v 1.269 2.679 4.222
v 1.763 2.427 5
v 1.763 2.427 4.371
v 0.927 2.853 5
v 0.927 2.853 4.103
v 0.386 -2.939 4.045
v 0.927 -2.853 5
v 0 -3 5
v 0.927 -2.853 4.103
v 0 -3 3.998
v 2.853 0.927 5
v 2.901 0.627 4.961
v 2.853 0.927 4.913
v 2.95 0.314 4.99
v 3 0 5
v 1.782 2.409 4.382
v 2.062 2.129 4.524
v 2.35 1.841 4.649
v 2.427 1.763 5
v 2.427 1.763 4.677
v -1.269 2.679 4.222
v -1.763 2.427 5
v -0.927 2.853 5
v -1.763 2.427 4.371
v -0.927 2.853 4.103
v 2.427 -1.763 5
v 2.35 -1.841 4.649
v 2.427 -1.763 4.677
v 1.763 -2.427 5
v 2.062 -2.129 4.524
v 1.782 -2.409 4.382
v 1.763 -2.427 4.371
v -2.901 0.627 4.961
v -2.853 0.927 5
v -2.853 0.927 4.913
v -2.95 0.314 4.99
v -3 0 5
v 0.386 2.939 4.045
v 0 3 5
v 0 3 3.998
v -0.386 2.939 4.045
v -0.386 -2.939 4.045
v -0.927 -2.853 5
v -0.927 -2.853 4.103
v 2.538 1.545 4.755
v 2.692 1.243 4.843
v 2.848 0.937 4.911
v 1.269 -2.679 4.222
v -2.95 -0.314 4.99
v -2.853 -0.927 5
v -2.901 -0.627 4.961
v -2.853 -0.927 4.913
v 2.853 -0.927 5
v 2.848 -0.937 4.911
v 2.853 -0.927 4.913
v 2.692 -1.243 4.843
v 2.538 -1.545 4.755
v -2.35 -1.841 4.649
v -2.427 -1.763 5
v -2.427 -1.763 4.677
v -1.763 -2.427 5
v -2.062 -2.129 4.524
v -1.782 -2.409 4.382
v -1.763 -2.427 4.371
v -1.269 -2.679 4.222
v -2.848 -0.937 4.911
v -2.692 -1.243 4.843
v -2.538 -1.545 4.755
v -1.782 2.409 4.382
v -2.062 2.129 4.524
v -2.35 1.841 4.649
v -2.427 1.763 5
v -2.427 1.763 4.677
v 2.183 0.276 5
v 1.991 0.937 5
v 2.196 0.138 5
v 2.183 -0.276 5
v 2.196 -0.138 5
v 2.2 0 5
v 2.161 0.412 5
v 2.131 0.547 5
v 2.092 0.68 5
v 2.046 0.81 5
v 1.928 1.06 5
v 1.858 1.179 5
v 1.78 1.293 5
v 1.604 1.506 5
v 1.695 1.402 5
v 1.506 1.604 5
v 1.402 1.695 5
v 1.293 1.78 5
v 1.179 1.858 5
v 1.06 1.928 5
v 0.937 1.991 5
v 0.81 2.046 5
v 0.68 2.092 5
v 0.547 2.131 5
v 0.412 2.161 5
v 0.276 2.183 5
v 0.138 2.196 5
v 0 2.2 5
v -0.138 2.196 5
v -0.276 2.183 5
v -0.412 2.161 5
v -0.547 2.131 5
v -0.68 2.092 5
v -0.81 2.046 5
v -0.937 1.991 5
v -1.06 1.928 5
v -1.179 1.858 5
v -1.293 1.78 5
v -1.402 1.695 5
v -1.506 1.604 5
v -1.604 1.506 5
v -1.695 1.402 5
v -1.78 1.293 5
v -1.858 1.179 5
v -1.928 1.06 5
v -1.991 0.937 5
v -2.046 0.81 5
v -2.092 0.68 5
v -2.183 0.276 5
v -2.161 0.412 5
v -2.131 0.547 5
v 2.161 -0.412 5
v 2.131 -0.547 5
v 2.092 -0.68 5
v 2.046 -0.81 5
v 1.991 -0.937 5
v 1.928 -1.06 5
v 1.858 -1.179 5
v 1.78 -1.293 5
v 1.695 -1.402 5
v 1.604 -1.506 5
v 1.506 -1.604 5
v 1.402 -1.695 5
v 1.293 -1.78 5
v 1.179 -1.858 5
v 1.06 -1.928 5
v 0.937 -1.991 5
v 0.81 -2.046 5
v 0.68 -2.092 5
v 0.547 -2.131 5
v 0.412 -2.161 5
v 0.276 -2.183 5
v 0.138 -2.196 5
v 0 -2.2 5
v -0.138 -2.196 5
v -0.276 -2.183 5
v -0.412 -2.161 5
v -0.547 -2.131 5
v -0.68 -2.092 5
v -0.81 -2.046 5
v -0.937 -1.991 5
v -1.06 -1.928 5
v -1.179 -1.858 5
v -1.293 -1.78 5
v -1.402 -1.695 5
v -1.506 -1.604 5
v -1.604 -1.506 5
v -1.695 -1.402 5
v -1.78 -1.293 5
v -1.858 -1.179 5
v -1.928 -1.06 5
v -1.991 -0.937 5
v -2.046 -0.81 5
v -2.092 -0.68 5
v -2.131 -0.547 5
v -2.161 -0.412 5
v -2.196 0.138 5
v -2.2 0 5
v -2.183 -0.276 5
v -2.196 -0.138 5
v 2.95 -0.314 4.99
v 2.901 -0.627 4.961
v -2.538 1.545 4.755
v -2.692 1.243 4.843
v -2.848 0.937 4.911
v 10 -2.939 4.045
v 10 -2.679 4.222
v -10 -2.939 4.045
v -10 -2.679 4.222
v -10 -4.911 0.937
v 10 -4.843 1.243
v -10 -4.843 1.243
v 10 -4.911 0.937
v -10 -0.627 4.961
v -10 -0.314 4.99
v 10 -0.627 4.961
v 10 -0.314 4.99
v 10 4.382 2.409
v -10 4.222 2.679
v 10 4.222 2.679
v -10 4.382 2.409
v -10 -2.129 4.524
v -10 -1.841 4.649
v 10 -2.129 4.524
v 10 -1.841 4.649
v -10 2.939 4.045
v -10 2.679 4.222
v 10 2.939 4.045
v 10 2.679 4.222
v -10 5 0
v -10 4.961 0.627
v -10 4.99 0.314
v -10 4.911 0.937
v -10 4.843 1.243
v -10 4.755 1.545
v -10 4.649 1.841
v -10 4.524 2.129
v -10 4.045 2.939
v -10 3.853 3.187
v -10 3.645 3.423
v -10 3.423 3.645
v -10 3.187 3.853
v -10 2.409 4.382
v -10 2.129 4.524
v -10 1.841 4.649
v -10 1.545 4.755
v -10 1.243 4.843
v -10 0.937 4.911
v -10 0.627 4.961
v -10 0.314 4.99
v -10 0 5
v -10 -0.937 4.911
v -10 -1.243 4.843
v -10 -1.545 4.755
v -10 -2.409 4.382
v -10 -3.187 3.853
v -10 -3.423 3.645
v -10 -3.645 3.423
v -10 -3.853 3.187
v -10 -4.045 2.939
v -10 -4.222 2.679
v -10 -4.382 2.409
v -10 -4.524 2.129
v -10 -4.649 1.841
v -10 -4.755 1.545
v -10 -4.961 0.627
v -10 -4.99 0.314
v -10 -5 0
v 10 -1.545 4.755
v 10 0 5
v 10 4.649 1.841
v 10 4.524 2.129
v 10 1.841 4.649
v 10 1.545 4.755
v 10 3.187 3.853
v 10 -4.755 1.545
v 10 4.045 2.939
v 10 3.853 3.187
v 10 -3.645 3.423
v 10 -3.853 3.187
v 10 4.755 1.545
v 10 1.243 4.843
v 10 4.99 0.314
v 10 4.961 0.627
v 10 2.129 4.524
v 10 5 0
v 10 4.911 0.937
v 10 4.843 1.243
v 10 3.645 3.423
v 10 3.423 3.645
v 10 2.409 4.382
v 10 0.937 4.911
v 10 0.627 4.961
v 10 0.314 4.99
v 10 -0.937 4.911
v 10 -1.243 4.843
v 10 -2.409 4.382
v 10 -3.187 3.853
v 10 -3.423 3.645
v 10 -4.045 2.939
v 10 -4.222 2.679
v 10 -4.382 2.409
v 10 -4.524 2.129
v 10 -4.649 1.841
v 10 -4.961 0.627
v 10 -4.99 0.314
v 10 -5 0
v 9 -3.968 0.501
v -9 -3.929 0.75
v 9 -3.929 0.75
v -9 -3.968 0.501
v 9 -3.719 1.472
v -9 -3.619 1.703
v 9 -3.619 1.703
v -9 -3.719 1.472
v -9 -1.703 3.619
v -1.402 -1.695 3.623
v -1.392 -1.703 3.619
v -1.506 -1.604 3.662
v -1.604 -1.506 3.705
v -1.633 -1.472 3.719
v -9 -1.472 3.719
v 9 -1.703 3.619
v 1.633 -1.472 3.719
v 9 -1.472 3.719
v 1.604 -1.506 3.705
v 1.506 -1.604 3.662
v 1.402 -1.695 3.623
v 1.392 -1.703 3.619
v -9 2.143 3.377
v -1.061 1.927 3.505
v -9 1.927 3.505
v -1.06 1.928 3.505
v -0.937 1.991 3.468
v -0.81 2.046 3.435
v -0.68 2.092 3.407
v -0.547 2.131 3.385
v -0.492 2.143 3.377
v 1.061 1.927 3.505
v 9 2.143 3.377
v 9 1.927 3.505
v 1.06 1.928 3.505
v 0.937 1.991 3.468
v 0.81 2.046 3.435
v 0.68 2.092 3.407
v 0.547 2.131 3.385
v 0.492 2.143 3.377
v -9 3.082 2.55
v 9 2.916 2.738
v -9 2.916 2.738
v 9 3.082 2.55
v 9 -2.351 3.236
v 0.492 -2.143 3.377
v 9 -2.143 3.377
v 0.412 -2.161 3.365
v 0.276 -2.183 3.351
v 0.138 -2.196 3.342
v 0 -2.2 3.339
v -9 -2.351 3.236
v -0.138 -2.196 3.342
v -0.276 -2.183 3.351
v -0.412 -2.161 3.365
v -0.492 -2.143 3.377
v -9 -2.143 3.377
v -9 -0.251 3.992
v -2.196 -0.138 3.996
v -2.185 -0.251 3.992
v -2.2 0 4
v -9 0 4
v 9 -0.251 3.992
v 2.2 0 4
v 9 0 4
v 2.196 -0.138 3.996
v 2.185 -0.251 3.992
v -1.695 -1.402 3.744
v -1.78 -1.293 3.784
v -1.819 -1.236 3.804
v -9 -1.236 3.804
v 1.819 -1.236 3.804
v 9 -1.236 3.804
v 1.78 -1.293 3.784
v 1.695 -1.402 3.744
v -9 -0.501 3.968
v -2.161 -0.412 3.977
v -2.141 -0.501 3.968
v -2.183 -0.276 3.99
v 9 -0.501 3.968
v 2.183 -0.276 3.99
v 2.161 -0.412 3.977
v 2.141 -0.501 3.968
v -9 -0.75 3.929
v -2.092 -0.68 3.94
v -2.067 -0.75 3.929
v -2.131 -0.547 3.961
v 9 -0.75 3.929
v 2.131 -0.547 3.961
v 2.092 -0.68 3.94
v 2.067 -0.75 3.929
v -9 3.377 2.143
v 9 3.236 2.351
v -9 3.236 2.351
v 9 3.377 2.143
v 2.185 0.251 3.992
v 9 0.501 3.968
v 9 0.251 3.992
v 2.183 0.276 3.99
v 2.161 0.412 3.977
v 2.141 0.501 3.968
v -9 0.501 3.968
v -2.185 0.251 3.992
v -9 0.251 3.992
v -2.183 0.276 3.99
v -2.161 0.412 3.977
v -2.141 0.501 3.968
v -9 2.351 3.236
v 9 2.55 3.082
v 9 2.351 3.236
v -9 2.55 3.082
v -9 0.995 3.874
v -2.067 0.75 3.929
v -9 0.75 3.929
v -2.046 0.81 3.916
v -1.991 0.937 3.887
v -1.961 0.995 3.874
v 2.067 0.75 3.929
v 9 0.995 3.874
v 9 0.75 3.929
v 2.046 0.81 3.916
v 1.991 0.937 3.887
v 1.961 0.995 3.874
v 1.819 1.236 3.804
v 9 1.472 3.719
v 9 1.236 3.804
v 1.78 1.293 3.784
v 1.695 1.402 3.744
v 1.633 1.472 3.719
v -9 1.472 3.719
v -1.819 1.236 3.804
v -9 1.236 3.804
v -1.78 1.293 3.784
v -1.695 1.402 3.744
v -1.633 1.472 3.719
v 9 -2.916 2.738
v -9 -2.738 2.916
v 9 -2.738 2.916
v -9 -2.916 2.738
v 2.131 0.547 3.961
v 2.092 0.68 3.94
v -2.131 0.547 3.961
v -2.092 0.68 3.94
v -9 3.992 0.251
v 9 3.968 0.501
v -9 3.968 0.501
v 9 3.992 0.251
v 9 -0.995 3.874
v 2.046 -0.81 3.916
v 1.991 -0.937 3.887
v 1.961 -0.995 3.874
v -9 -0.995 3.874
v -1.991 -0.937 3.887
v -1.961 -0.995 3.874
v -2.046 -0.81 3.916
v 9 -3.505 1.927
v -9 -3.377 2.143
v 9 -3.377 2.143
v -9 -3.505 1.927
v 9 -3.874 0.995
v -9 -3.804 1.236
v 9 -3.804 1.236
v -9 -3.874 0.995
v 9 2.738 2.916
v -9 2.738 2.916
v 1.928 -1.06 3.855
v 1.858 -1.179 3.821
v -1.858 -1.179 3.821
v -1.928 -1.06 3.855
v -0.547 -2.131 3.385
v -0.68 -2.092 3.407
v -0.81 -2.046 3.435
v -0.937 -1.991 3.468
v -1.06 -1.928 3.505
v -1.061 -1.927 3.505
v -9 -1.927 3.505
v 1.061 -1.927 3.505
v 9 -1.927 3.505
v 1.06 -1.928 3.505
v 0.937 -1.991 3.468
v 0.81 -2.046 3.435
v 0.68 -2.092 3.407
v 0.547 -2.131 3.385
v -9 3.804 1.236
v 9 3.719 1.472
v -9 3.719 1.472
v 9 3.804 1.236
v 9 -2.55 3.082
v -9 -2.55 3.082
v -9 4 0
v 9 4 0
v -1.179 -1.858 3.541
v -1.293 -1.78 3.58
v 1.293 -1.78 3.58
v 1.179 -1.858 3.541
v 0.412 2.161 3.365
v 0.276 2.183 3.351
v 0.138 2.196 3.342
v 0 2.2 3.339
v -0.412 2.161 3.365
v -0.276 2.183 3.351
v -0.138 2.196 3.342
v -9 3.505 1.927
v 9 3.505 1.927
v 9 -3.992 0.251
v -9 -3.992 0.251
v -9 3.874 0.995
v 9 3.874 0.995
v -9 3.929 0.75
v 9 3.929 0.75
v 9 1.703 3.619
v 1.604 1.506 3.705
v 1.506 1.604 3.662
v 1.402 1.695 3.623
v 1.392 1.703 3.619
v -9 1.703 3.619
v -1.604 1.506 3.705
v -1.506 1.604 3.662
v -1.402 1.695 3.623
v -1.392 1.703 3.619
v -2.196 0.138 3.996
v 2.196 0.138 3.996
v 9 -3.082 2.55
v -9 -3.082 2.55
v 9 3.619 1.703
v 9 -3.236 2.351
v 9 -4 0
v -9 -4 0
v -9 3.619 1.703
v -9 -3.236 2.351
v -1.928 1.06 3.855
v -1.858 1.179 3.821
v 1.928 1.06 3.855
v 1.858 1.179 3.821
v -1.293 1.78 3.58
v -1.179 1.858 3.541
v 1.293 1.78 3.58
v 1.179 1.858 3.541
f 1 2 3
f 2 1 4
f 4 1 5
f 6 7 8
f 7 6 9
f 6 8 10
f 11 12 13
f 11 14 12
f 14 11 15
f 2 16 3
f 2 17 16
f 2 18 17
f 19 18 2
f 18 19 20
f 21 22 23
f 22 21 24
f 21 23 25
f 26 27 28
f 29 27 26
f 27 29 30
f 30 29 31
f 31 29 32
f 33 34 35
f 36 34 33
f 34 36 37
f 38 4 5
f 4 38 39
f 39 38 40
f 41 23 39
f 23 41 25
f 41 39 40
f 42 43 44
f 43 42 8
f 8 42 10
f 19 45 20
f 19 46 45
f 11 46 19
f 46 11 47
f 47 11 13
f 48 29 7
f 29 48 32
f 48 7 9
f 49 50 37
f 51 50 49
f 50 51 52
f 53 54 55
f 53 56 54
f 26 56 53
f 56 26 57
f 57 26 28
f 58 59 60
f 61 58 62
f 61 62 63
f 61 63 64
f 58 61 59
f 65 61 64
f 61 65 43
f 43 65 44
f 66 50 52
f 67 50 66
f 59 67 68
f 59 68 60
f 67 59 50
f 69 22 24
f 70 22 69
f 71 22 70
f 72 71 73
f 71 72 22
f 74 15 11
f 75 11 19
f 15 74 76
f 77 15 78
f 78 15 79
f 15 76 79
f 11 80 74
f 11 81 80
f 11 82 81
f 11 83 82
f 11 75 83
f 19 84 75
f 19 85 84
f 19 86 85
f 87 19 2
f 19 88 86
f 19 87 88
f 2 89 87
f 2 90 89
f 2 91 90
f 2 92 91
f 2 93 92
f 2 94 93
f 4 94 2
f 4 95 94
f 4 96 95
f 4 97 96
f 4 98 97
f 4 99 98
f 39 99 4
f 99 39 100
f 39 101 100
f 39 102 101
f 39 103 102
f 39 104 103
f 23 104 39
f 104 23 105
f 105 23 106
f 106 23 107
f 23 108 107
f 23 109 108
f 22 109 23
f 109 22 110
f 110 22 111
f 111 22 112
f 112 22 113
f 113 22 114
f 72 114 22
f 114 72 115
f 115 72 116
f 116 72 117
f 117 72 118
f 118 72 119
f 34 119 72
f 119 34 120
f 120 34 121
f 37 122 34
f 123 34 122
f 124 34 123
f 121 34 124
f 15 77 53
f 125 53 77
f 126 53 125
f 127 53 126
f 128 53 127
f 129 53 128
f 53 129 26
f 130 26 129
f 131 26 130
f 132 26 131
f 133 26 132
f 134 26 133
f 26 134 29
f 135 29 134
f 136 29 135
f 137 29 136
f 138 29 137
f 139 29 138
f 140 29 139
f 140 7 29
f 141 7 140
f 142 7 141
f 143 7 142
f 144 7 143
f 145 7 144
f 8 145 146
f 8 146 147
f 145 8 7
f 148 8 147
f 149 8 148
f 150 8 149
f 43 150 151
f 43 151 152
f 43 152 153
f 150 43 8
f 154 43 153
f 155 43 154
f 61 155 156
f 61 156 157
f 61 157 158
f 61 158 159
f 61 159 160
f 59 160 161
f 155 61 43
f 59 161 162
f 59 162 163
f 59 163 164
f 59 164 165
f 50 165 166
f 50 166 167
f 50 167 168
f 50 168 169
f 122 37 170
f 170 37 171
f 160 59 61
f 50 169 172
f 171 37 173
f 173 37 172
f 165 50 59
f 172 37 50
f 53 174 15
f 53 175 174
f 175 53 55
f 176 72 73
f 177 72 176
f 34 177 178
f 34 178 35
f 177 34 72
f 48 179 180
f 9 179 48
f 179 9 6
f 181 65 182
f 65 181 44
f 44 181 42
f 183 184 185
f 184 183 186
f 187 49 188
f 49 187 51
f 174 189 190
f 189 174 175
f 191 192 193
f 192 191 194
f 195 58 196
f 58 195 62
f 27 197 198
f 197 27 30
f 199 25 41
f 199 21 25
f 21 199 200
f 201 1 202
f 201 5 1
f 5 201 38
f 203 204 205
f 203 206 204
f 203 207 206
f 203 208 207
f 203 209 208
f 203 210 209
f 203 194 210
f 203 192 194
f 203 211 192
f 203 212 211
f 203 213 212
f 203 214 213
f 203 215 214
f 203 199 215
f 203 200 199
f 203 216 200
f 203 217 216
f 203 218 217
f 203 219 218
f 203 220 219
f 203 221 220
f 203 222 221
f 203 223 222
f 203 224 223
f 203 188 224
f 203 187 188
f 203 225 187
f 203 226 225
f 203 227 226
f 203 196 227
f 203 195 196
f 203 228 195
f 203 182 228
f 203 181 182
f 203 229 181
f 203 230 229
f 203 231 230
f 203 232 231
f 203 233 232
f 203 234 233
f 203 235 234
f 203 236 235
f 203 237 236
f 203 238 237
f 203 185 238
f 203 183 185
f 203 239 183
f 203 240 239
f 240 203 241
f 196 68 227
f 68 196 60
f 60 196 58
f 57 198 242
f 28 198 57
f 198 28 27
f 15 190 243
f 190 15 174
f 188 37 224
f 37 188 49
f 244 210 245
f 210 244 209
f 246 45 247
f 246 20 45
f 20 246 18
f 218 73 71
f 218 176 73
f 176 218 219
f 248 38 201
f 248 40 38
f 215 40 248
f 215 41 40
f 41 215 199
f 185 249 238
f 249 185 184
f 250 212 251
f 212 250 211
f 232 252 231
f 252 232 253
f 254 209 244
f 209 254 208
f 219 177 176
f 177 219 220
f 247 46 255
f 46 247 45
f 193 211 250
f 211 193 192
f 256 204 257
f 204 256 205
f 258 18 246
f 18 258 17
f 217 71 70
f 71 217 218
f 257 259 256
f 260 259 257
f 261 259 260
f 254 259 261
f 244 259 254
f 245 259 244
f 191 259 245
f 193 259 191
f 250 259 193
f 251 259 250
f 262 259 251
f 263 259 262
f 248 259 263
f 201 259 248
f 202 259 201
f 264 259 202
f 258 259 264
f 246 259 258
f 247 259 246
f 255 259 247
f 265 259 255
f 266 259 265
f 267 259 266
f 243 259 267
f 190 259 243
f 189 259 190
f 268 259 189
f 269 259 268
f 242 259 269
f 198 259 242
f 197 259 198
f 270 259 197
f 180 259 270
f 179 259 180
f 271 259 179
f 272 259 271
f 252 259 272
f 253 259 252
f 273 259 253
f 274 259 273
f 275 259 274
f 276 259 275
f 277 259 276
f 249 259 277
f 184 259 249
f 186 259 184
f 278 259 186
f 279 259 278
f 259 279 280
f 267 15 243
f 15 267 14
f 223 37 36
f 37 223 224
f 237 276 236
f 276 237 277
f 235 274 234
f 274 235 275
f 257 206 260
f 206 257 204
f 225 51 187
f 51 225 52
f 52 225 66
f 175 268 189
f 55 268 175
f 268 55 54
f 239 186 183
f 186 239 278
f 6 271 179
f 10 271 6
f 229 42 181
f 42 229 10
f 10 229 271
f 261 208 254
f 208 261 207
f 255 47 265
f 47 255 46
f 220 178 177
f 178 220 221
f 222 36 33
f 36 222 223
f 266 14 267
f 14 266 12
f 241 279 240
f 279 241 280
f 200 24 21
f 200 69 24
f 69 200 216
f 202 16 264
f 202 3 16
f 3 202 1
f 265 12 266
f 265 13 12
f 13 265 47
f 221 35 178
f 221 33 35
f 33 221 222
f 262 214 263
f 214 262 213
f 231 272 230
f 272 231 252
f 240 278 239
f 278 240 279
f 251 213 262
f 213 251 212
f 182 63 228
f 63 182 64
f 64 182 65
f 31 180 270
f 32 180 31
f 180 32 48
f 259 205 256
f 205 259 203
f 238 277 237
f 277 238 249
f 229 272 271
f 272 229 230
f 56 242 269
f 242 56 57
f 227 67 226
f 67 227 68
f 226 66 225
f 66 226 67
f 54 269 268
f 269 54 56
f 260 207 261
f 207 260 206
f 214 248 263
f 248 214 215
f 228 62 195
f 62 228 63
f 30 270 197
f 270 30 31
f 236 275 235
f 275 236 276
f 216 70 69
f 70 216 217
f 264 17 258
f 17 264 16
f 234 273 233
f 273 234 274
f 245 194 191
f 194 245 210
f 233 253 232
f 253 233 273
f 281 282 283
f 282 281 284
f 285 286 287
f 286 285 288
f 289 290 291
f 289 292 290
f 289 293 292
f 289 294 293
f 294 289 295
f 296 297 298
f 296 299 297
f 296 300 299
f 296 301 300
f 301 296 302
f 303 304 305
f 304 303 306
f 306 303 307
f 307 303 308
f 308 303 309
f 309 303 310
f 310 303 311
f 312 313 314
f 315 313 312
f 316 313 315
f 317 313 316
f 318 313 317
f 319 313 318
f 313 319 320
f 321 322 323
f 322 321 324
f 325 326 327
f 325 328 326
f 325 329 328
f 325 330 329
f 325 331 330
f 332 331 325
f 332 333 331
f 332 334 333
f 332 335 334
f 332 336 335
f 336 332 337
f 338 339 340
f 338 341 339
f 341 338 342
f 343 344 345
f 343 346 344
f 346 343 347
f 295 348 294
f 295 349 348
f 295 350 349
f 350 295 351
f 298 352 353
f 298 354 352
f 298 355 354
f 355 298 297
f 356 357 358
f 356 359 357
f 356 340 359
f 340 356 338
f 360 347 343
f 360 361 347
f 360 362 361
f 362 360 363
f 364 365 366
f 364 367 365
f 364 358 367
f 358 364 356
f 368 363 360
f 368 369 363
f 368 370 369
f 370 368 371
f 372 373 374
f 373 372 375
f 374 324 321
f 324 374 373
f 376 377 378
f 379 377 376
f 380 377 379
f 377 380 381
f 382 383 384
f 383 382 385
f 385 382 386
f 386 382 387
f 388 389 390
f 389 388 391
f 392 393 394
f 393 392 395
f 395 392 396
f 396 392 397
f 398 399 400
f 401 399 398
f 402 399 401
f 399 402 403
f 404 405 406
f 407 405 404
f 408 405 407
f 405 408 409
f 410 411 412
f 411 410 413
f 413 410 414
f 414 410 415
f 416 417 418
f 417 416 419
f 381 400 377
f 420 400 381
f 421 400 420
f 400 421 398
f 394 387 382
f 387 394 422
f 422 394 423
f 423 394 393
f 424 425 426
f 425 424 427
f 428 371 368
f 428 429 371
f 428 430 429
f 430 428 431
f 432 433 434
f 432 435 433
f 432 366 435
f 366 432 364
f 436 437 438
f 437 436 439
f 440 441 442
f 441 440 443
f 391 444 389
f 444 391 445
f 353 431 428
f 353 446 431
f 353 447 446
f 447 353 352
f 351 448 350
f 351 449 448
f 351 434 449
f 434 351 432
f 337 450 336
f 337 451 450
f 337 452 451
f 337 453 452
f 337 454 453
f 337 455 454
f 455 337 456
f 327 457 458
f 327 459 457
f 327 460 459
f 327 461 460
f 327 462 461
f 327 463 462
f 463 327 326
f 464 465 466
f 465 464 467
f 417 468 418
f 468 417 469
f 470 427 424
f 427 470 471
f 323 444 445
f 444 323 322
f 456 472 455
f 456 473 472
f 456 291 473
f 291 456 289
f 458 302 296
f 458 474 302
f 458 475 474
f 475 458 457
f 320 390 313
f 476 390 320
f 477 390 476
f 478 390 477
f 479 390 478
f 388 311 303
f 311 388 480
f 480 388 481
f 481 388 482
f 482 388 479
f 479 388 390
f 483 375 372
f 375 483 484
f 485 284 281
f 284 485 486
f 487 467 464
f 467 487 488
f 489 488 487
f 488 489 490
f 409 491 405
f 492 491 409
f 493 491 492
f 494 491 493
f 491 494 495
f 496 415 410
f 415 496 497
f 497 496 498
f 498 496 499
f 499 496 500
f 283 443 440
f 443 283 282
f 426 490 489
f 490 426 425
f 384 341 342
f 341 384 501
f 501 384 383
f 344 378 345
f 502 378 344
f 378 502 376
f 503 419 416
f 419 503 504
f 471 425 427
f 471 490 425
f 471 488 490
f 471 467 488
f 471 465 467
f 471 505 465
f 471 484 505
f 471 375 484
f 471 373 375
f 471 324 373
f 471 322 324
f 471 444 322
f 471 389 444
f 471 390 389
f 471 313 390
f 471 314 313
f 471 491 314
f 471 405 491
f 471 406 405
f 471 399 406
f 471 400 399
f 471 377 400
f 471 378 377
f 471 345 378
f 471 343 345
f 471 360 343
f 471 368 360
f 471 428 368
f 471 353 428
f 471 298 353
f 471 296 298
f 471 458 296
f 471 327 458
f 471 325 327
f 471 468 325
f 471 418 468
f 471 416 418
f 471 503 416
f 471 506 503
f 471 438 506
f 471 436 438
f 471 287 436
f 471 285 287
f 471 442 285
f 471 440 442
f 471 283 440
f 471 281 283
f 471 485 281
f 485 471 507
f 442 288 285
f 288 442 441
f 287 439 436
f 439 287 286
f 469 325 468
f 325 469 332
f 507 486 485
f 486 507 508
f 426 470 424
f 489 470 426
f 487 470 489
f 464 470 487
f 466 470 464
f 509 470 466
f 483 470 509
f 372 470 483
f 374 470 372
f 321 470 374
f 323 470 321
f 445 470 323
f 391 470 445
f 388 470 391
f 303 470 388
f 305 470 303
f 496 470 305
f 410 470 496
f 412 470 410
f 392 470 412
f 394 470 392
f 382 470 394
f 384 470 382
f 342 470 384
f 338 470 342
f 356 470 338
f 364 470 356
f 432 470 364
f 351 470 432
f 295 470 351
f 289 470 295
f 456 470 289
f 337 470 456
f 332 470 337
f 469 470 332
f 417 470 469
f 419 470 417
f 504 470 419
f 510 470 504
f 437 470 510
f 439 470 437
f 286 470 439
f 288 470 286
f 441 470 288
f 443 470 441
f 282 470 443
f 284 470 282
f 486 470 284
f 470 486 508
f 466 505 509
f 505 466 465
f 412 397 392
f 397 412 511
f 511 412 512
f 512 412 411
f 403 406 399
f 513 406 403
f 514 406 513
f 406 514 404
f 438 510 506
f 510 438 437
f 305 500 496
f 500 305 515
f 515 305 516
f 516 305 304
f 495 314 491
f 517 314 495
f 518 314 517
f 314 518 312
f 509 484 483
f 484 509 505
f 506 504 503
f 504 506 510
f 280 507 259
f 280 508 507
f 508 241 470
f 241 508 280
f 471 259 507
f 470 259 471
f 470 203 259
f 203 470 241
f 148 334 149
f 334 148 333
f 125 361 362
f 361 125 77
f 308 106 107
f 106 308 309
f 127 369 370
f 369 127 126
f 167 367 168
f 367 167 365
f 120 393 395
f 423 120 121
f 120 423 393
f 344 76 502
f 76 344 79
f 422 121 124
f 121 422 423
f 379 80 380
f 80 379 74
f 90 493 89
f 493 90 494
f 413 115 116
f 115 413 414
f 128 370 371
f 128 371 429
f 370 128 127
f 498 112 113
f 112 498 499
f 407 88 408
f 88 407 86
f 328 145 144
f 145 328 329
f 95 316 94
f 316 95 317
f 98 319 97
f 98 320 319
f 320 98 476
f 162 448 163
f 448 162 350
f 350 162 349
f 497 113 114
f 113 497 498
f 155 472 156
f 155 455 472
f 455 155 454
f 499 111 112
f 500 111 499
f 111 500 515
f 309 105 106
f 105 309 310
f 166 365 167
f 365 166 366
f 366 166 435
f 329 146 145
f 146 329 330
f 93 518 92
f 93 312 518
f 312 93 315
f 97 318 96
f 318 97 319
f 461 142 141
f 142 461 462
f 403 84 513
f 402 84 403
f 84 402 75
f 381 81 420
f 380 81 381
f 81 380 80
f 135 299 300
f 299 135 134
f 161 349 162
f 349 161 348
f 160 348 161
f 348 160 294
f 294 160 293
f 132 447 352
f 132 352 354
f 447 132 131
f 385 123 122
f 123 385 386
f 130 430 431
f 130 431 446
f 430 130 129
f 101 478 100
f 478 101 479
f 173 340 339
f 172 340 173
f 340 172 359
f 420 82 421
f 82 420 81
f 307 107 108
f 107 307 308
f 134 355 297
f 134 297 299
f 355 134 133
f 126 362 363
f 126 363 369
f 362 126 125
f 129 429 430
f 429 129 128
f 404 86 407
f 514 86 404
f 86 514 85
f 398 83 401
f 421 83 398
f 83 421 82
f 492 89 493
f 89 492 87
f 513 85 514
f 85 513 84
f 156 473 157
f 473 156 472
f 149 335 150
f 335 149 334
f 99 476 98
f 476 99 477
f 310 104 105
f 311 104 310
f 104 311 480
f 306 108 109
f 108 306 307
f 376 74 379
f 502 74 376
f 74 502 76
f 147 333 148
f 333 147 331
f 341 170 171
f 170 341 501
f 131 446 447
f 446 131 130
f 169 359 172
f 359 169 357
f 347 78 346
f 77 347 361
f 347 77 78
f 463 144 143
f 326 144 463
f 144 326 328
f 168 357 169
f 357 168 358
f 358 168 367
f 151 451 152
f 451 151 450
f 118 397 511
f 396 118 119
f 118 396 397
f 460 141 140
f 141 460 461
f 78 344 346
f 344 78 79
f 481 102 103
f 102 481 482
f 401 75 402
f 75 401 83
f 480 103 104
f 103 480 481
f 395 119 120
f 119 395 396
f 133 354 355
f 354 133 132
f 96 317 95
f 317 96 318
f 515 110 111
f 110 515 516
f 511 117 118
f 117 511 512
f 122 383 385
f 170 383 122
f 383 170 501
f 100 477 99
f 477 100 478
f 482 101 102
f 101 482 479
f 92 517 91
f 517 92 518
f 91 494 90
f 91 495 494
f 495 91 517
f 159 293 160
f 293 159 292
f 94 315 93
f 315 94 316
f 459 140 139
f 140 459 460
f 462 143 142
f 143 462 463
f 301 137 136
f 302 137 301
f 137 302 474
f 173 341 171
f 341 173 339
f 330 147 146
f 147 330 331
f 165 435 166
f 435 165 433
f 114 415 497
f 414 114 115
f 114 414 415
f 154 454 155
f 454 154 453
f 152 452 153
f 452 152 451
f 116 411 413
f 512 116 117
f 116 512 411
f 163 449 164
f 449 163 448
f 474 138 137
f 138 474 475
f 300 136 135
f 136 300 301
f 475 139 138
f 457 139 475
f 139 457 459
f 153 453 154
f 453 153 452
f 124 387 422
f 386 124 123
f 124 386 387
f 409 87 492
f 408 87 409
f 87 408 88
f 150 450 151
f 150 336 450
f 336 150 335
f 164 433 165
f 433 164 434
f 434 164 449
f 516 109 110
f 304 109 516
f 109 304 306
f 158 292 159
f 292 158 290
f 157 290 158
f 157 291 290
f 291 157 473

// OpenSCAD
module reflector( radius=10,length=20,led_holder=2, thickness=2, led=1 ) {

echo("This is a reflector radius h=", radius, " and l=", length);
    
$fn=100;
led_holder_height=radius;
    
rotate([0,90,0]) {
    difference() {
        union() {
            rotate([0,270,0]) {
                translate([0, 0, (radius-led_holder_height)])
                    cylinder(h = led_holder_height, r = led_holder, center = false, $fn=20);
            }
            cylinder(h = length, r = radius, center = true);
    }
    
    cylinder(h = length-thickness, r = radius-thickness/2, center = true);
    translate([radius/2,0,0])
        cube(size = [radius,radius*2,length], center = true);
            rotate([0,270,0]) {
                translate([0, 0, (radius-3)])
                    cylinder(h = led_holder_height, r = led, center = false);
                }
        }
    }
}

reflector(radius=5, led=2.2, led_holder=3);
